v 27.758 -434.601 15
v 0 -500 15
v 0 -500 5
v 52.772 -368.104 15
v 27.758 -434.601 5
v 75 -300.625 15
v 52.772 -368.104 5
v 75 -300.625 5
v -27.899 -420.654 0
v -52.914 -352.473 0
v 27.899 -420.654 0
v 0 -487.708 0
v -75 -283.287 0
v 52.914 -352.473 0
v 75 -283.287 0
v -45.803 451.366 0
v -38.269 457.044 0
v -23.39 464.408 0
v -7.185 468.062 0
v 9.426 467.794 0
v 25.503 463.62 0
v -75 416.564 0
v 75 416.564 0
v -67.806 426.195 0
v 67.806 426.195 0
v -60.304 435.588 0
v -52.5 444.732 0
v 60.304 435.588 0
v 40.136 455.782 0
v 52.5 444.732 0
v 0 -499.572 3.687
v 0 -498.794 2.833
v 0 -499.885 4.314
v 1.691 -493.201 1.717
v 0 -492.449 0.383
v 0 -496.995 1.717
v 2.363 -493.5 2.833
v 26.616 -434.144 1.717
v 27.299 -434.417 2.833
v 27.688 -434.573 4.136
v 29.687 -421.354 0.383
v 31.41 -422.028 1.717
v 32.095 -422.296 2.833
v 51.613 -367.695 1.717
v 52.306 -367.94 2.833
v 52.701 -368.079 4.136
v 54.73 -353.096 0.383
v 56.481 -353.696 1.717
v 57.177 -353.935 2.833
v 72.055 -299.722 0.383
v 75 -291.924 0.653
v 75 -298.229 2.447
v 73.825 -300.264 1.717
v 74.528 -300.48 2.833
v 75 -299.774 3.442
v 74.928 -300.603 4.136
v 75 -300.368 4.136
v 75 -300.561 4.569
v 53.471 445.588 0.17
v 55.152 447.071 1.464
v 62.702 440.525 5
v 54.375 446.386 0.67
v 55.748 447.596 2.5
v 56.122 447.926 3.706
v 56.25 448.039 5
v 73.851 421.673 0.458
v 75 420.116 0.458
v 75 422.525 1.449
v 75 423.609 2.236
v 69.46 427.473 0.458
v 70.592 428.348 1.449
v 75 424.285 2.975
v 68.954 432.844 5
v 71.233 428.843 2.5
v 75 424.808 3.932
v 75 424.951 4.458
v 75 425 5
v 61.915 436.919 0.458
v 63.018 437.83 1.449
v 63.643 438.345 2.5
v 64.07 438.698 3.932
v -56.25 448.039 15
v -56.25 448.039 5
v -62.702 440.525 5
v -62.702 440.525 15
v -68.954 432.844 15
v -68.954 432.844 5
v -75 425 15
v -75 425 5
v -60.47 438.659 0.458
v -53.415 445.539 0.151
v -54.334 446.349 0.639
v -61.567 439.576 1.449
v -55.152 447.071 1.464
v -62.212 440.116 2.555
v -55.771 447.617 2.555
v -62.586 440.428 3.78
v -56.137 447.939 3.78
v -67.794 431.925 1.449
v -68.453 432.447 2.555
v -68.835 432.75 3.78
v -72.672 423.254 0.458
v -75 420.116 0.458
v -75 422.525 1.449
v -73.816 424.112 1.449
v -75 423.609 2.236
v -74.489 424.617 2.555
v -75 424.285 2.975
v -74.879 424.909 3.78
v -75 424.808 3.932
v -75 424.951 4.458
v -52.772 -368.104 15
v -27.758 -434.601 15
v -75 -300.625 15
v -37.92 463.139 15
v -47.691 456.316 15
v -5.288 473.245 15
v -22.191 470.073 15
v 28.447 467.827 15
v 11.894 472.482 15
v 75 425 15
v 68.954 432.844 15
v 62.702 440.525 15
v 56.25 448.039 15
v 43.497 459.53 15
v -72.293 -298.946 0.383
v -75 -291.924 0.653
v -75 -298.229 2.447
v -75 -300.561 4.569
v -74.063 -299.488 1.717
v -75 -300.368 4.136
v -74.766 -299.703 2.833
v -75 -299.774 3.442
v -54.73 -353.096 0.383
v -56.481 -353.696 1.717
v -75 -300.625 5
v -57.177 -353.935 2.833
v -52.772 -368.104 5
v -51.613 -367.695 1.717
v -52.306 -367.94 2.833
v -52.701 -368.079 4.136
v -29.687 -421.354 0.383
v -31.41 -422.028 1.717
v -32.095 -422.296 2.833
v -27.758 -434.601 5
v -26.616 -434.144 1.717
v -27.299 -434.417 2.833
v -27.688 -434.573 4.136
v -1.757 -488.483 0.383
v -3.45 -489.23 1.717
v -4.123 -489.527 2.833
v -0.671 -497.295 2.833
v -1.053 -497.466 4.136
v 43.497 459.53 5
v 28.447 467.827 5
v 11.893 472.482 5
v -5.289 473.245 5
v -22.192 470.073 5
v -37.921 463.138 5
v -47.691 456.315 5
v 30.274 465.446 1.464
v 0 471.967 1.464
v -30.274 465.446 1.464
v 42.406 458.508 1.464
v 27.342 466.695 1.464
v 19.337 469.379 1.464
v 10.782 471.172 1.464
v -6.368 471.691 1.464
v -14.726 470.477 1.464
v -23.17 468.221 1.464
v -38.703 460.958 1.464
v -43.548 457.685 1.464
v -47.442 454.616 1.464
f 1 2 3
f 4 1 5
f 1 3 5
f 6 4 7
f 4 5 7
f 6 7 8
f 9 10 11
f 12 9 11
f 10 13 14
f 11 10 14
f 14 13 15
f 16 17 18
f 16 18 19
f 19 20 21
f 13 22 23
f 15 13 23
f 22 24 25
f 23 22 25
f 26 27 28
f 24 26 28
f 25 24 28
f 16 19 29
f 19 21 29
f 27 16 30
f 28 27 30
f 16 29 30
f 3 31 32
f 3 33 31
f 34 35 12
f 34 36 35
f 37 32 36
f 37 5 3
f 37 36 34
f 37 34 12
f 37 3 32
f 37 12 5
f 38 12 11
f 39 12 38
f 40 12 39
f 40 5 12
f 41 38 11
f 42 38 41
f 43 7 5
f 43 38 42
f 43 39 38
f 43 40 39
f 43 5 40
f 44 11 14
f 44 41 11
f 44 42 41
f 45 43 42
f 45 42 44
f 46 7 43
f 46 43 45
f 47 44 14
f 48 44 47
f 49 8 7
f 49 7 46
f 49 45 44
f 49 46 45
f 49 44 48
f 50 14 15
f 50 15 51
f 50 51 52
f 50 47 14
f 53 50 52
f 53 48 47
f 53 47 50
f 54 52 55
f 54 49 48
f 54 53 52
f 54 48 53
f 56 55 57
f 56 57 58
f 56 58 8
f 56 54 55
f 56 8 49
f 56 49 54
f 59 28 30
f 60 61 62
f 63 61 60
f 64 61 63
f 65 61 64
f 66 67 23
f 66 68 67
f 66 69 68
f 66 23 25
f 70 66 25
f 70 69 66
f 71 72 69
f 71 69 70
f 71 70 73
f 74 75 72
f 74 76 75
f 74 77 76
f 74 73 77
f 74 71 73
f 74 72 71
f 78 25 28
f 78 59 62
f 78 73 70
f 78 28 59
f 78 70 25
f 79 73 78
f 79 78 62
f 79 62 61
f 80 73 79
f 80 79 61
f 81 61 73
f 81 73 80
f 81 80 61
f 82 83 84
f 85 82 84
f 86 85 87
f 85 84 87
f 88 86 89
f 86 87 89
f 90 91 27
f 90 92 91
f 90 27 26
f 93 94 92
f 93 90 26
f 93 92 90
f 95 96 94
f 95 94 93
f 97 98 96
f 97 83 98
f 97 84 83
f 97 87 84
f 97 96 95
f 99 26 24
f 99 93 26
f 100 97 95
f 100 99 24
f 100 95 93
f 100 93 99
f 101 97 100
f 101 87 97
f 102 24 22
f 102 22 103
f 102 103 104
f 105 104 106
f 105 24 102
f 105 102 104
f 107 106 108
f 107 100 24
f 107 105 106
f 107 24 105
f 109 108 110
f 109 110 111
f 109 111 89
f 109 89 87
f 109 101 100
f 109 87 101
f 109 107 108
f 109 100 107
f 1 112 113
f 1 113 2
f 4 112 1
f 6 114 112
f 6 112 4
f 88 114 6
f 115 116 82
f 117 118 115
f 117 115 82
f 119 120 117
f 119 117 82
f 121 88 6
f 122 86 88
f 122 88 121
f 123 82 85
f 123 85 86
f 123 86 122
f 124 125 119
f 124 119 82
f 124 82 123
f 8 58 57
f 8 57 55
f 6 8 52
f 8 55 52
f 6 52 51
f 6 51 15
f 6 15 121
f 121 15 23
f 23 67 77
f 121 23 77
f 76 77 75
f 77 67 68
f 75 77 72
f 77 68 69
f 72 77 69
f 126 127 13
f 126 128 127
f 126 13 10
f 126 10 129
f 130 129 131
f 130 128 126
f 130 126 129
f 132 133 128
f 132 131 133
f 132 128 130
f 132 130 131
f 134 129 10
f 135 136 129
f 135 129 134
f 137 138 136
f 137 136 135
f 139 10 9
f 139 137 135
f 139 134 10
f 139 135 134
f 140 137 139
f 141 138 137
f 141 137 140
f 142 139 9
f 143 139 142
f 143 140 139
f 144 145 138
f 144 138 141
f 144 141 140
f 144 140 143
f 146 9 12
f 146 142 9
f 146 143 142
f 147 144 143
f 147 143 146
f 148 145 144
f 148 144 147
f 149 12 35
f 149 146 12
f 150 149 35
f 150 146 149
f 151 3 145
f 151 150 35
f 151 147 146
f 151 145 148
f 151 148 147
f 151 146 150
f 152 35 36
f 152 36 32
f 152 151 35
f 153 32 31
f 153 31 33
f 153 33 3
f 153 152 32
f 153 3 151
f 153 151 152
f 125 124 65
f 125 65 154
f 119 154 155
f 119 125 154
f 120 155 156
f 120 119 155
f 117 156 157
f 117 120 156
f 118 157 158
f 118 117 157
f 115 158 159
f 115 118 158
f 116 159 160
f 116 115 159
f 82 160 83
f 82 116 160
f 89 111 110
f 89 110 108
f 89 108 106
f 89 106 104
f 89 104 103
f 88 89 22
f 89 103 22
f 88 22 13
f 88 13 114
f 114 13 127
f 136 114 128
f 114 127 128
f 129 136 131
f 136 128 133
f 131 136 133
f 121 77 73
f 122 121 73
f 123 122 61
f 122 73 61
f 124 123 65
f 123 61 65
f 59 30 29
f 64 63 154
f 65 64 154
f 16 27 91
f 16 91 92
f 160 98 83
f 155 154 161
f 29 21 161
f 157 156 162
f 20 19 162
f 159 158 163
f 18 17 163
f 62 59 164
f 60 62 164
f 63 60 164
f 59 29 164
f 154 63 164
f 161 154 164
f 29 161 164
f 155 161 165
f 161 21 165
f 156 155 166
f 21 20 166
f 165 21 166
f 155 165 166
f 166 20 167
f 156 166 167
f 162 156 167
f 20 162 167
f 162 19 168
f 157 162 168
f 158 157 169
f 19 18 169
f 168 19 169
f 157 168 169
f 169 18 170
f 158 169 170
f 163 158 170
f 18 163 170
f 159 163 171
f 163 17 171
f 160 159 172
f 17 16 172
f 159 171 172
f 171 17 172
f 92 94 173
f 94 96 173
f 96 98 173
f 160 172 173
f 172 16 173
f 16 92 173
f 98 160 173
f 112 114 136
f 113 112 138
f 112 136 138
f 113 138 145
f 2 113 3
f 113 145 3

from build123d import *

# Parameters (mm, degrees)
F1_DEPTH = 15
F2_R     = 75
F3_R     = 5
F4_R     = 5


with BuildPart() as f1:
    # F0 (on Top) → F1 (new body)
    with BuildSketch(Plane.XY):
        with BuildLine():
            ThreePointArc((75, 425), (40.1650429449, 465.165042945), (0, 500))
            ThreePointArc((0, 500), (-40.1650429449, 465.165042945), (-75, 425))
            Line((-75, 425), (-75, -300.6246098625))
            ThreePointArc((-75, -300.6246098625), (-40.6105882367, -401.4824298779), (0, -500))
            ThreePointArc((0, -500), (40.6105882367, -401.4824298779), (75, -300.6246098625))
            Line((75, -300.6246098625), (75, 425))
        make_face()
    extrude(amount=F1_DEPTH)

    # F2
    f2_edges = [f1.edges().sort_by_distance(p)[0] for p in [
        (0, 500, 7.5),
    ]]
    fillet(f2_edges, radius=F2_R)

    # F3
    f3_edges = [f1.edges().sort_by_distance(p)[0] for p in [
        (0, 473.431348, 0),
    ]]
    fillet(f3_edges, radius=F3_R)

    # F4
    f4_edges = [f1.edges().sort_by_distance(p)[0] for p in [
        (-40.610588, -401.48243, 0),
        (40.610588, -401.48243, 0),
    ]]
    fillet(f4_edges, radius=F4_R)


solid = f1.part
